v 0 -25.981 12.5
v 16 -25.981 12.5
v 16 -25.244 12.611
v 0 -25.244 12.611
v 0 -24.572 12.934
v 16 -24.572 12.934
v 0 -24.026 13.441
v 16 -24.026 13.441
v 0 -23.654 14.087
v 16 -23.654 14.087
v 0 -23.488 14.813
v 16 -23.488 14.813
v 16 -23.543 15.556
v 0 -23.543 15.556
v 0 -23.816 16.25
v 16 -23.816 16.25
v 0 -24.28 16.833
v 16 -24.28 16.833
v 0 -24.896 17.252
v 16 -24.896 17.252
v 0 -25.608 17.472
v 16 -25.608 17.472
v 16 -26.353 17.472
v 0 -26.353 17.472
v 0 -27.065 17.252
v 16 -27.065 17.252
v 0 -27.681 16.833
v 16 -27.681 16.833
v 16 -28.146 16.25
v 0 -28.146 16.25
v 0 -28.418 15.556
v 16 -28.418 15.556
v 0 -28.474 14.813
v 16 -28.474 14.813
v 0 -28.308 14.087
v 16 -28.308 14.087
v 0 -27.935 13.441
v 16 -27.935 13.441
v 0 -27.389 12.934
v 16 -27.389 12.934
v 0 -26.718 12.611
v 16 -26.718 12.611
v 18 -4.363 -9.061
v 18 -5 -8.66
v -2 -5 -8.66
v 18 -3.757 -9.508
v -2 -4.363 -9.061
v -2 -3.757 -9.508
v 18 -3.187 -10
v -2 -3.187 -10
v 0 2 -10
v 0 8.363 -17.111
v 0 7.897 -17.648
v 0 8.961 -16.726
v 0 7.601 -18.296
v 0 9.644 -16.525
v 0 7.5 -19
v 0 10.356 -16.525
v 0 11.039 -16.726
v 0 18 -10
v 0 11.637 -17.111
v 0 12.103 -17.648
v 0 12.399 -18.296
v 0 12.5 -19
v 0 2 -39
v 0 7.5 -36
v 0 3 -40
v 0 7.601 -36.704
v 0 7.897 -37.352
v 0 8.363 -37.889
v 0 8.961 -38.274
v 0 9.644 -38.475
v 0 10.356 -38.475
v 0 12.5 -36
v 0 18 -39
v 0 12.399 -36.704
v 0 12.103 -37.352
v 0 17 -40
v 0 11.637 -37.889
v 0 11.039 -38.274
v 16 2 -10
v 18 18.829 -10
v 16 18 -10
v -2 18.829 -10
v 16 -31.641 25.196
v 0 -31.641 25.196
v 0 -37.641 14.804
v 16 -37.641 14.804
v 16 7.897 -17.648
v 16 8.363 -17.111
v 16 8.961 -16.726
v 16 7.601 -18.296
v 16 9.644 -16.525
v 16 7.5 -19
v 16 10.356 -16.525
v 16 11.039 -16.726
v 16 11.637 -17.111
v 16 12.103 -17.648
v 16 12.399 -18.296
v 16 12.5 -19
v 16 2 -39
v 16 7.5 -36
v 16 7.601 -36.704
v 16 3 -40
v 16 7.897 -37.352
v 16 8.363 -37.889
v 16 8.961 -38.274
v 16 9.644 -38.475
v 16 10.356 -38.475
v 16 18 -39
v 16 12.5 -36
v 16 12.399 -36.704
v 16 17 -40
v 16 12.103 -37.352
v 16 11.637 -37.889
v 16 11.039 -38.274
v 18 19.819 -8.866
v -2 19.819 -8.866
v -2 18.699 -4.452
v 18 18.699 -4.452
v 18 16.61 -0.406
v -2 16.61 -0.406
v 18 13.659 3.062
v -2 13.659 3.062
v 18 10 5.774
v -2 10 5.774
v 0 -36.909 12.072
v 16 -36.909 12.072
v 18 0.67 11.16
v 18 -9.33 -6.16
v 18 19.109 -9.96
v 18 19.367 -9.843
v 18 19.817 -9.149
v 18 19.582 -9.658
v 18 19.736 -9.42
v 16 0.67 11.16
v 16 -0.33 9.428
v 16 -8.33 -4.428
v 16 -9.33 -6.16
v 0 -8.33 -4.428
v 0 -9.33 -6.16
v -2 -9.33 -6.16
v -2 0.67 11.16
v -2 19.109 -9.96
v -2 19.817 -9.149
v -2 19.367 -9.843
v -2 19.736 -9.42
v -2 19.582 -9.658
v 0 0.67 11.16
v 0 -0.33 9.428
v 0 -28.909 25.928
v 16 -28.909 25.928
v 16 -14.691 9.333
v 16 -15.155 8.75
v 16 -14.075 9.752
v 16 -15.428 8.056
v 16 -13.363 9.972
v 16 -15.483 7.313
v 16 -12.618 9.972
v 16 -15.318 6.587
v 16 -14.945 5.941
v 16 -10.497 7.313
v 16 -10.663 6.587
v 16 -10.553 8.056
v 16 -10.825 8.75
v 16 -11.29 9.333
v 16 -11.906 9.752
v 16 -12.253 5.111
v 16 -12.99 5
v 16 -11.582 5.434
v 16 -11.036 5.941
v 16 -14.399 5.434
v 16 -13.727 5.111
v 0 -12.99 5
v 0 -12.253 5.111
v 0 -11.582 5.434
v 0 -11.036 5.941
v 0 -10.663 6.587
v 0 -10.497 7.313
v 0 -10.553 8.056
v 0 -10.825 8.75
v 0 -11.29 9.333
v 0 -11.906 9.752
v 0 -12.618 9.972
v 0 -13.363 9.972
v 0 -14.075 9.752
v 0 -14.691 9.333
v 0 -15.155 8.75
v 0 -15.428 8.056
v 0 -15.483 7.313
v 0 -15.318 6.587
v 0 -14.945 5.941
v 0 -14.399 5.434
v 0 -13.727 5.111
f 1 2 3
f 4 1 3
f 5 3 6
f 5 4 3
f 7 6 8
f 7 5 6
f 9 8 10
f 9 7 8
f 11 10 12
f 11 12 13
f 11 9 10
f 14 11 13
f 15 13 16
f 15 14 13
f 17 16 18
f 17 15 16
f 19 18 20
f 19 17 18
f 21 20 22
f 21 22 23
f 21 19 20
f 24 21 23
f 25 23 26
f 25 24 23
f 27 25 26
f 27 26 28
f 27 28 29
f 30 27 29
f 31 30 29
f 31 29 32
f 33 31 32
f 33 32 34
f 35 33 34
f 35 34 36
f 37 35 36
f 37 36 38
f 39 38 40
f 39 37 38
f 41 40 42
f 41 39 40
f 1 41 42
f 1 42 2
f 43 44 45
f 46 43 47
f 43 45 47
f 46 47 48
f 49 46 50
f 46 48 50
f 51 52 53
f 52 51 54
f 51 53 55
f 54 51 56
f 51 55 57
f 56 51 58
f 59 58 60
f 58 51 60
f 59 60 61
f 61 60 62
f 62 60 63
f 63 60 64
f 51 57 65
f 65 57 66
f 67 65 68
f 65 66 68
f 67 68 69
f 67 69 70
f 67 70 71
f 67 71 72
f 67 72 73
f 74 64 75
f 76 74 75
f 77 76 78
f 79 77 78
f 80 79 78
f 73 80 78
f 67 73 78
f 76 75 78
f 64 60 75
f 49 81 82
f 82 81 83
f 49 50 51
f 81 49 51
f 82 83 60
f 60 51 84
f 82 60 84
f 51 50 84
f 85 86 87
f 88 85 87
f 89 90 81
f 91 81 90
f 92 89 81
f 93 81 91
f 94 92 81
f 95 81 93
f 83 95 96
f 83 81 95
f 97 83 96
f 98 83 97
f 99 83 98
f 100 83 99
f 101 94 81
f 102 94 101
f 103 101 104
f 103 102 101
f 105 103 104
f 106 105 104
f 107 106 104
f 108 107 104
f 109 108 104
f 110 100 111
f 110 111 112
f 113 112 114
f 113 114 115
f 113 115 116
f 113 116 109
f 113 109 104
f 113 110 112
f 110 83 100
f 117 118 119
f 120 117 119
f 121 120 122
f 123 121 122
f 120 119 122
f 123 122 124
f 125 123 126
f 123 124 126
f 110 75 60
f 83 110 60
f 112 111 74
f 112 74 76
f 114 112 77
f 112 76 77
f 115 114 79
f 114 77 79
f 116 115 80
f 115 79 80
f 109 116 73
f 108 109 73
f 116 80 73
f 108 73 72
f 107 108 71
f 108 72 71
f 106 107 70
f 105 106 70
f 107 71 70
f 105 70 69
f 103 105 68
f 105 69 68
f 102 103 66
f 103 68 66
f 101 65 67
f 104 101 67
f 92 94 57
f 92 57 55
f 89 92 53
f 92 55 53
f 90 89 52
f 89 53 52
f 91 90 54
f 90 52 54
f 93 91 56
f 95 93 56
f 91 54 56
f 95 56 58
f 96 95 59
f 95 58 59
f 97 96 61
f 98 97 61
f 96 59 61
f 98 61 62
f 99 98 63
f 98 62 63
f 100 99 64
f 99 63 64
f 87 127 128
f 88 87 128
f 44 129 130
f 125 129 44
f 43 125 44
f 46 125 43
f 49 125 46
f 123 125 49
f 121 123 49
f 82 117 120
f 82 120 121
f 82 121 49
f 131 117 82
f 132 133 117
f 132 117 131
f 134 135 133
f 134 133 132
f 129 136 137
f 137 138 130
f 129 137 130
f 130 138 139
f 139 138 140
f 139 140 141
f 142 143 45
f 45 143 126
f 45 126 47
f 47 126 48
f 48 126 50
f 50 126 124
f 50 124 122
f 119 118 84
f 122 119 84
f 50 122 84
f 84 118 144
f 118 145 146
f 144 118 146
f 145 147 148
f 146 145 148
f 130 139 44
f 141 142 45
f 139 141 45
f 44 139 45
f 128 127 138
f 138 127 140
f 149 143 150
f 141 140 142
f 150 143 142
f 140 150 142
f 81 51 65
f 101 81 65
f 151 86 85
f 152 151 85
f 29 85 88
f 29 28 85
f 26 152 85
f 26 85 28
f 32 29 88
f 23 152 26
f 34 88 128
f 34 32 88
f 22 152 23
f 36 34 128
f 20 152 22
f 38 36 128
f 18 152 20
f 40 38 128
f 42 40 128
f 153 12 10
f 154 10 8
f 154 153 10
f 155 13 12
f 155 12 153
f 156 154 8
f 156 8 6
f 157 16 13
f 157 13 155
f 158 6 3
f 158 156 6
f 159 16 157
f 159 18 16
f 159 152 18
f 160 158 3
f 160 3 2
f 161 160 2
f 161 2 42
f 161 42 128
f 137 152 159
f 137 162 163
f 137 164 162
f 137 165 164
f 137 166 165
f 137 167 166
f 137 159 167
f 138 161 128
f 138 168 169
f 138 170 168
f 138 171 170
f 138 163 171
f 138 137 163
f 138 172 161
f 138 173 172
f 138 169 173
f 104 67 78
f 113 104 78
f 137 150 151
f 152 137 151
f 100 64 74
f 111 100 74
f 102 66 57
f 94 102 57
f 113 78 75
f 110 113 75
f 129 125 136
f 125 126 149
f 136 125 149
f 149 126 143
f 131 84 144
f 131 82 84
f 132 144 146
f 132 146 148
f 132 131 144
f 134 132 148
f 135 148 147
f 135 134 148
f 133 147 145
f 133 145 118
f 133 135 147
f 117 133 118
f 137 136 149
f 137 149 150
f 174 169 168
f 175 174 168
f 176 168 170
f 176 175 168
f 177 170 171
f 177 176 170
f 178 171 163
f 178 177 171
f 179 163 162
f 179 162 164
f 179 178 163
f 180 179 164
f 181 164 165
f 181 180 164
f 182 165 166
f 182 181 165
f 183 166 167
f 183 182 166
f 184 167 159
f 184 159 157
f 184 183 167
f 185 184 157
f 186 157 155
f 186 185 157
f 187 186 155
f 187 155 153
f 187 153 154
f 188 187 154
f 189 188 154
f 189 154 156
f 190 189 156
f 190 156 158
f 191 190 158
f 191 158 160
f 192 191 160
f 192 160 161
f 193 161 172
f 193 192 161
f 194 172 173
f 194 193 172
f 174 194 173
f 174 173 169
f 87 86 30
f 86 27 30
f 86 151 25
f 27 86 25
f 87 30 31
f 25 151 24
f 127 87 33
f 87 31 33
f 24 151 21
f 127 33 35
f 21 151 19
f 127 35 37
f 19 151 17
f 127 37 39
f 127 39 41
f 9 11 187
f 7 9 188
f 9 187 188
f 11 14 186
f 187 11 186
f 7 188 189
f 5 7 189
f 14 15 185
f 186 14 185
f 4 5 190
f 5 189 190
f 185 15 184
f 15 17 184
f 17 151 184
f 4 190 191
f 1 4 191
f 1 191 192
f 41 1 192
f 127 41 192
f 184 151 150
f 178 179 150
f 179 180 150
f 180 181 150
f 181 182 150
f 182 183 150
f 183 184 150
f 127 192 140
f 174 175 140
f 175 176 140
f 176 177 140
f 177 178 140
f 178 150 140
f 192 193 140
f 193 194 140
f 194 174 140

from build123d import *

# Parameters (mm, degrees)
SKETCH1_R                = 2.5
BOSS_EXTRUDE1_DEPTH      = 16
BOSS_EXTRUDE2_DEPTH      = 2
BOSS_EXTRUDE2_DEPTH_BACK = 18
CHAMFER1_SIZE            = 2
FILLET1_R                = 1


with BuildPart() as part:
    # Sketch1 → Boss-Extrude1 (new body)
    with BuildSketch(Plane(origin=(0, 0, 0), x_dir=(0, 0, -1), z_dir=(1, 0, 0))):
        with BuildLine():
            Line((40, 3), (40, 17))
            Line((40, 17), (39, 18))
            Line((39, 18), (15, 18))
            Line((15, 18), (10, 18))
            Line((10, 18), (10, 19.940079597))
            ThreePointArc((10, 19.940079597), (0.884122958, 16.920488715), (-5.773502692, 10))
            Line((-5.773502692, 10), (-11.160254038, 0.669872981))
            Line((-11.160254038, 0.669872981), (-9.42820323, -0.330127019))
            Line((-9.42820323, -0.330127019), (-26.92820323, -30.641016151))
            Line((-26.92820323, -30.641016151), (-13.07179677, -38.641016151))
            Line((-13.07179677, -38.641016151), (4.42820323, -8.330127019))
            Line((4.42820323, -8.330127019), (6.160254038, -9.330127019))
            Line((6.160254038, -9.330127019), (8.660254038, -5))
            ThreePointArc((8.660254038, -5), (9.278898856, -4.055883484), (10, -3.187499614))
            Line((10, -3.187499614), (10, 2))
            Line((10, 2), (15, 2))
            Line((15, 2), (39, 2))
            Line((39, 2), (40, 3))
        make_face()
        with Locations((-15, -25.980762114)):
            Circle(SKETCH1_R, mode=Mode.SUBTRACT)
        with Locations((-7.5, -12.990381057)):
            Circle(SKETCH1_R, mode=Mode.SUBTRACT)
        with BuildLine():
            Line((19, 12.5), (36, 12.5))
            ThreePointArc((36, 12.5), (38.5, 10), (36, 7.5))
            Line((36, 7.5), (19, 7.5))
            ThreePointArc((19, 7.5), (16.5, 10), (19, 12.5))
        make_face(mode=Mode.SUBTRACT)
    extrude(amount=BOSS_EXTRUDE1_DEPTH)

    # Sketch2 → Boss-Extrude2 (add, two sides: drawn at the far end of the back side and taken through both)
    with BuildSketch(Plane(origin=(16, 0, 0), x_dir=(0, 0, -1), z_dir=(1, 0, 0)).offset(-BOSS_EXTRUDE2_DEPTH_BACK)):
        with BuildLine():
            Line((-11.160254038, 0.669872981), (6.160254038, -9.330127019))
            Line((6.160254038, -9.330127019), (8.660254038, -5))
            ThreePointArc((8.660254038, -5), (9.278898856, -4.055883484), (10, -3.187499614))
            Line((10, -3.187499614), (10, 19.940079597))
            ThreePointArc((10, 19.940079597), (0.884122958, 16.920488715), (-5.773502692, 10))
            Line((-5.773502692, 10), (-11.160254038, 0.669872981))
        make_face()
    extrude(amount=BOSS_EXTRUDE2_DEPTH + BOSS_EXTRUDE2_DEPTH_BACK)

    # Chamfer1
    chamfer1_edges = [part.edges().sort_by_distance(p)[0] for p in [
        (8, -38.641016151, 13.07179677),
        (8, -30.641016151, 26.92820323),
    ]]
    chamfer(chamfer1_edges, length=CHAMFER1_SIZE)

    # Fillet1
    fillet1_edges = [part.edges().sort_by_distance(p)[0] for p in [
        (8, 19.940079597, -10),
    ]]
    fillet(fillet1_edges, radius=FILLET1_R)


solid = part.part
